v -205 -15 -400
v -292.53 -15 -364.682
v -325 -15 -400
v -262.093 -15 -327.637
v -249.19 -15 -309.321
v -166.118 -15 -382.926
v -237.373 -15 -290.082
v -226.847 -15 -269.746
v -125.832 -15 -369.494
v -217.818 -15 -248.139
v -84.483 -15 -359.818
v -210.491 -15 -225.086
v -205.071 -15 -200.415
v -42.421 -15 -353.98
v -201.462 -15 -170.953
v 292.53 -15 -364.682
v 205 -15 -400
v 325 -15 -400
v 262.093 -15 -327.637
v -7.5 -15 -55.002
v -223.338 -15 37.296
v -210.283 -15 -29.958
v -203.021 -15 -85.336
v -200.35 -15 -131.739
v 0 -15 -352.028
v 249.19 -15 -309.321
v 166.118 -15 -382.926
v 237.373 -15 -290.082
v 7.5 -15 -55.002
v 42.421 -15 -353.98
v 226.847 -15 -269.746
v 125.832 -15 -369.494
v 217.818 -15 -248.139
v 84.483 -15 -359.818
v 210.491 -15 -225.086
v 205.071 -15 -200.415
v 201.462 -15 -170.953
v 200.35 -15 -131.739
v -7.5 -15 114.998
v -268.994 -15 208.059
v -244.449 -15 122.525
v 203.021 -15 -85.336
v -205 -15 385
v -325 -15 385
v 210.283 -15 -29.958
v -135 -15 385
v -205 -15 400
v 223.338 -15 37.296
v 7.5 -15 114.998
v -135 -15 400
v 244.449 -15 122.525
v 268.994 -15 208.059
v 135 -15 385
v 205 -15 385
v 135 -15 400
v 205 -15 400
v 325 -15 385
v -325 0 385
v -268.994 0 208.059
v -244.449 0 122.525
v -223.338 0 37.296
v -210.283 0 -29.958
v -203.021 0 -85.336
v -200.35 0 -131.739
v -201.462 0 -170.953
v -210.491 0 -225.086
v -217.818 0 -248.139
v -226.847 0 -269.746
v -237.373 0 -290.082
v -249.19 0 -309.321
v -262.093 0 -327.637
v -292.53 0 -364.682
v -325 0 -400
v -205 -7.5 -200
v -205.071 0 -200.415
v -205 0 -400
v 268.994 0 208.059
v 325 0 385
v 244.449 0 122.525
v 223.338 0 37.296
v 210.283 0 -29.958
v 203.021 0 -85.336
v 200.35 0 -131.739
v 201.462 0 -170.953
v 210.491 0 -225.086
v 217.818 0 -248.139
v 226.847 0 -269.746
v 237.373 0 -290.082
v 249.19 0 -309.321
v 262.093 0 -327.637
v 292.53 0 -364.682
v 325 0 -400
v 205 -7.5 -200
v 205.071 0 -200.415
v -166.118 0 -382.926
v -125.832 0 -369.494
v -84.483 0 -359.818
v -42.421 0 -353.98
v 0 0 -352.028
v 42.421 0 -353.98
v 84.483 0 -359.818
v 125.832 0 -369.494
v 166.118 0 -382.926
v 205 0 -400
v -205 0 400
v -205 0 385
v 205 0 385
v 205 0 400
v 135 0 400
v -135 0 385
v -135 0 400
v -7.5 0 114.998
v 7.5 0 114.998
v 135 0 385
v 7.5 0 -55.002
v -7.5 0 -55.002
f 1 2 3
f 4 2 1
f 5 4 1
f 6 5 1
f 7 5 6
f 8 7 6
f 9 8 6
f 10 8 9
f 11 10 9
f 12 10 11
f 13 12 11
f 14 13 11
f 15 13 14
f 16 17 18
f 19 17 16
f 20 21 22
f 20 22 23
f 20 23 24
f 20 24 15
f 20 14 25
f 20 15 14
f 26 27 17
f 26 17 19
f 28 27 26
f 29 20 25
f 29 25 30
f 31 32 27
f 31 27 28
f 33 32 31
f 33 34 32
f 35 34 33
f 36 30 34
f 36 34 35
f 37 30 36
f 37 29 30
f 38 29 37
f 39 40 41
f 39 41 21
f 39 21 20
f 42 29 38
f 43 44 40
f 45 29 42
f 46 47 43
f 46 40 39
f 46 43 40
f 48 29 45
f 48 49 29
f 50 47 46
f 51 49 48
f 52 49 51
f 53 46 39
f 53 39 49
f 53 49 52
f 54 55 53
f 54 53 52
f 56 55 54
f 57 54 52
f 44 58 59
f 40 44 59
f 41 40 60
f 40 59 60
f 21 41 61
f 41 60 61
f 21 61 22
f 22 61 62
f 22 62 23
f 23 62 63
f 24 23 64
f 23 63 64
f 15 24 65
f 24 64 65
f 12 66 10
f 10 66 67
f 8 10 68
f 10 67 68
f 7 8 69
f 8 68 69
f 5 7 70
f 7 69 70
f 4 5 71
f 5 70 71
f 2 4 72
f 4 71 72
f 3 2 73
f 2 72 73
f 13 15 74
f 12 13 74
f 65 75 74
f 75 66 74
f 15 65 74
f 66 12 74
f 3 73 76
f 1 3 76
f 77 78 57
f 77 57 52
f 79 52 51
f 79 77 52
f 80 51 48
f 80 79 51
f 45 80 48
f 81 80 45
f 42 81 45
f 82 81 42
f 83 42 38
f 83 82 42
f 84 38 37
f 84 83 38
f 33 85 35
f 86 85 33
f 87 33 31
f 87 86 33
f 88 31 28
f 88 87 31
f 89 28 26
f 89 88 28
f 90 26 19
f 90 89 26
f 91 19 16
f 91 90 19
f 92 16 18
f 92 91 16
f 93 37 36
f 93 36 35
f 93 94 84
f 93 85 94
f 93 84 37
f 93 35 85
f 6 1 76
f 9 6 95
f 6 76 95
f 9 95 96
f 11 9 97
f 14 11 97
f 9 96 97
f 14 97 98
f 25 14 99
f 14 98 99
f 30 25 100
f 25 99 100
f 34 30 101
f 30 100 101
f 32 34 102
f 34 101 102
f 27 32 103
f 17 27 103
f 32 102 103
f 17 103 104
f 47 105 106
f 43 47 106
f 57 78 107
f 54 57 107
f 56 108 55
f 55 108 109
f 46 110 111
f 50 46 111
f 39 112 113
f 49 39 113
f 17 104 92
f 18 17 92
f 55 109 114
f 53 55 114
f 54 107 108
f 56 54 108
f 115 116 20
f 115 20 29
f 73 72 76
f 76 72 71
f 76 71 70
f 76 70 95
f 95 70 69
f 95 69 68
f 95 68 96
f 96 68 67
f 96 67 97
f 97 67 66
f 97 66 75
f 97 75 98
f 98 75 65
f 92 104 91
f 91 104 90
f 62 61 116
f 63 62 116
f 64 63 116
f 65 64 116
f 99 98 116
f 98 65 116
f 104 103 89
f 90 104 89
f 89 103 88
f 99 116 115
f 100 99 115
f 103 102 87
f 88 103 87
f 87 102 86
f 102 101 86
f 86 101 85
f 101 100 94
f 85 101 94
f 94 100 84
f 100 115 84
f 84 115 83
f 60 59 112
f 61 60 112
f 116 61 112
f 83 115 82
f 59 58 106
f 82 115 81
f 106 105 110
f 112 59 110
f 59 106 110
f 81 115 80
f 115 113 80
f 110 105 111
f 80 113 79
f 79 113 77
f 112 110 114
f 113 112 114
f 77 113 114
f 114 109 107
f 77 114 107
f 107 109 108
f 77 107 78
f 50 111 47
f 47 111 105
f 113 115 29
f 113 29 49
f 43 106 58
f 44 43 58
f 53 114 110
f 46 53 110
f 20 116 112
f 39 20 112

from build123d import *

# Parameters (mm, degrees)
F0_W     = 15
F0_H     = 170
F1_DEPTH = 15


with BuildPart() as f1:
    # F0 (on Front) → F1 (new body)
    with BuildSketch(Plane.XZ):
        with BuildLine():
            Line((-135, 400), (-205, 400))
            Line((-205, 400), (-205, 385))
            Line((-205, 385), (-325, 385))
            add(Edge.make_bspline(
                [(-325, 385), (-252.9975507968, 162.8222248382), (-135.9970148871, -198.2060325168), (-272.5009566468, -343.9480268474), (-325, -400)],
                knots=[0, 0, 0, 0, 0.6154027299, 1, 1, 1, 1], degree=3))
            Line((-325, -400), (-205, -400))
            ThreePointArc((-205, -400), (0, -352.0282453036), (205, -400))
            Line((205, -400), (325, -400))
            add(Edge.make_bspline(
                [(325, 385), (252.9975507968, 162.8222248382), (135.9970148871, -198.2060325168), (272.5009566468, -343.9480268474), (325, -400)],
                knots=[0, 0, 0, 0, 0.6154027299, 1, 1, 1, 1], degree=3))
            Line((325, 385), (205, 385))
            Line((205, 385), (205, 400))
            Line((205, 400), (135, 400))
            Line((135, 400), (135, 385))
            Line((135, 385), (-135, 385))
            Line((-135, 385), (-135, 400))
        make_face()
        with Locations((0, 29.998)):
            Rectangle(F0_W, F0_H, mode=Mode.SUBTRACT)
    extrude(amount=F1_DEPTH)


solid = f1.part
